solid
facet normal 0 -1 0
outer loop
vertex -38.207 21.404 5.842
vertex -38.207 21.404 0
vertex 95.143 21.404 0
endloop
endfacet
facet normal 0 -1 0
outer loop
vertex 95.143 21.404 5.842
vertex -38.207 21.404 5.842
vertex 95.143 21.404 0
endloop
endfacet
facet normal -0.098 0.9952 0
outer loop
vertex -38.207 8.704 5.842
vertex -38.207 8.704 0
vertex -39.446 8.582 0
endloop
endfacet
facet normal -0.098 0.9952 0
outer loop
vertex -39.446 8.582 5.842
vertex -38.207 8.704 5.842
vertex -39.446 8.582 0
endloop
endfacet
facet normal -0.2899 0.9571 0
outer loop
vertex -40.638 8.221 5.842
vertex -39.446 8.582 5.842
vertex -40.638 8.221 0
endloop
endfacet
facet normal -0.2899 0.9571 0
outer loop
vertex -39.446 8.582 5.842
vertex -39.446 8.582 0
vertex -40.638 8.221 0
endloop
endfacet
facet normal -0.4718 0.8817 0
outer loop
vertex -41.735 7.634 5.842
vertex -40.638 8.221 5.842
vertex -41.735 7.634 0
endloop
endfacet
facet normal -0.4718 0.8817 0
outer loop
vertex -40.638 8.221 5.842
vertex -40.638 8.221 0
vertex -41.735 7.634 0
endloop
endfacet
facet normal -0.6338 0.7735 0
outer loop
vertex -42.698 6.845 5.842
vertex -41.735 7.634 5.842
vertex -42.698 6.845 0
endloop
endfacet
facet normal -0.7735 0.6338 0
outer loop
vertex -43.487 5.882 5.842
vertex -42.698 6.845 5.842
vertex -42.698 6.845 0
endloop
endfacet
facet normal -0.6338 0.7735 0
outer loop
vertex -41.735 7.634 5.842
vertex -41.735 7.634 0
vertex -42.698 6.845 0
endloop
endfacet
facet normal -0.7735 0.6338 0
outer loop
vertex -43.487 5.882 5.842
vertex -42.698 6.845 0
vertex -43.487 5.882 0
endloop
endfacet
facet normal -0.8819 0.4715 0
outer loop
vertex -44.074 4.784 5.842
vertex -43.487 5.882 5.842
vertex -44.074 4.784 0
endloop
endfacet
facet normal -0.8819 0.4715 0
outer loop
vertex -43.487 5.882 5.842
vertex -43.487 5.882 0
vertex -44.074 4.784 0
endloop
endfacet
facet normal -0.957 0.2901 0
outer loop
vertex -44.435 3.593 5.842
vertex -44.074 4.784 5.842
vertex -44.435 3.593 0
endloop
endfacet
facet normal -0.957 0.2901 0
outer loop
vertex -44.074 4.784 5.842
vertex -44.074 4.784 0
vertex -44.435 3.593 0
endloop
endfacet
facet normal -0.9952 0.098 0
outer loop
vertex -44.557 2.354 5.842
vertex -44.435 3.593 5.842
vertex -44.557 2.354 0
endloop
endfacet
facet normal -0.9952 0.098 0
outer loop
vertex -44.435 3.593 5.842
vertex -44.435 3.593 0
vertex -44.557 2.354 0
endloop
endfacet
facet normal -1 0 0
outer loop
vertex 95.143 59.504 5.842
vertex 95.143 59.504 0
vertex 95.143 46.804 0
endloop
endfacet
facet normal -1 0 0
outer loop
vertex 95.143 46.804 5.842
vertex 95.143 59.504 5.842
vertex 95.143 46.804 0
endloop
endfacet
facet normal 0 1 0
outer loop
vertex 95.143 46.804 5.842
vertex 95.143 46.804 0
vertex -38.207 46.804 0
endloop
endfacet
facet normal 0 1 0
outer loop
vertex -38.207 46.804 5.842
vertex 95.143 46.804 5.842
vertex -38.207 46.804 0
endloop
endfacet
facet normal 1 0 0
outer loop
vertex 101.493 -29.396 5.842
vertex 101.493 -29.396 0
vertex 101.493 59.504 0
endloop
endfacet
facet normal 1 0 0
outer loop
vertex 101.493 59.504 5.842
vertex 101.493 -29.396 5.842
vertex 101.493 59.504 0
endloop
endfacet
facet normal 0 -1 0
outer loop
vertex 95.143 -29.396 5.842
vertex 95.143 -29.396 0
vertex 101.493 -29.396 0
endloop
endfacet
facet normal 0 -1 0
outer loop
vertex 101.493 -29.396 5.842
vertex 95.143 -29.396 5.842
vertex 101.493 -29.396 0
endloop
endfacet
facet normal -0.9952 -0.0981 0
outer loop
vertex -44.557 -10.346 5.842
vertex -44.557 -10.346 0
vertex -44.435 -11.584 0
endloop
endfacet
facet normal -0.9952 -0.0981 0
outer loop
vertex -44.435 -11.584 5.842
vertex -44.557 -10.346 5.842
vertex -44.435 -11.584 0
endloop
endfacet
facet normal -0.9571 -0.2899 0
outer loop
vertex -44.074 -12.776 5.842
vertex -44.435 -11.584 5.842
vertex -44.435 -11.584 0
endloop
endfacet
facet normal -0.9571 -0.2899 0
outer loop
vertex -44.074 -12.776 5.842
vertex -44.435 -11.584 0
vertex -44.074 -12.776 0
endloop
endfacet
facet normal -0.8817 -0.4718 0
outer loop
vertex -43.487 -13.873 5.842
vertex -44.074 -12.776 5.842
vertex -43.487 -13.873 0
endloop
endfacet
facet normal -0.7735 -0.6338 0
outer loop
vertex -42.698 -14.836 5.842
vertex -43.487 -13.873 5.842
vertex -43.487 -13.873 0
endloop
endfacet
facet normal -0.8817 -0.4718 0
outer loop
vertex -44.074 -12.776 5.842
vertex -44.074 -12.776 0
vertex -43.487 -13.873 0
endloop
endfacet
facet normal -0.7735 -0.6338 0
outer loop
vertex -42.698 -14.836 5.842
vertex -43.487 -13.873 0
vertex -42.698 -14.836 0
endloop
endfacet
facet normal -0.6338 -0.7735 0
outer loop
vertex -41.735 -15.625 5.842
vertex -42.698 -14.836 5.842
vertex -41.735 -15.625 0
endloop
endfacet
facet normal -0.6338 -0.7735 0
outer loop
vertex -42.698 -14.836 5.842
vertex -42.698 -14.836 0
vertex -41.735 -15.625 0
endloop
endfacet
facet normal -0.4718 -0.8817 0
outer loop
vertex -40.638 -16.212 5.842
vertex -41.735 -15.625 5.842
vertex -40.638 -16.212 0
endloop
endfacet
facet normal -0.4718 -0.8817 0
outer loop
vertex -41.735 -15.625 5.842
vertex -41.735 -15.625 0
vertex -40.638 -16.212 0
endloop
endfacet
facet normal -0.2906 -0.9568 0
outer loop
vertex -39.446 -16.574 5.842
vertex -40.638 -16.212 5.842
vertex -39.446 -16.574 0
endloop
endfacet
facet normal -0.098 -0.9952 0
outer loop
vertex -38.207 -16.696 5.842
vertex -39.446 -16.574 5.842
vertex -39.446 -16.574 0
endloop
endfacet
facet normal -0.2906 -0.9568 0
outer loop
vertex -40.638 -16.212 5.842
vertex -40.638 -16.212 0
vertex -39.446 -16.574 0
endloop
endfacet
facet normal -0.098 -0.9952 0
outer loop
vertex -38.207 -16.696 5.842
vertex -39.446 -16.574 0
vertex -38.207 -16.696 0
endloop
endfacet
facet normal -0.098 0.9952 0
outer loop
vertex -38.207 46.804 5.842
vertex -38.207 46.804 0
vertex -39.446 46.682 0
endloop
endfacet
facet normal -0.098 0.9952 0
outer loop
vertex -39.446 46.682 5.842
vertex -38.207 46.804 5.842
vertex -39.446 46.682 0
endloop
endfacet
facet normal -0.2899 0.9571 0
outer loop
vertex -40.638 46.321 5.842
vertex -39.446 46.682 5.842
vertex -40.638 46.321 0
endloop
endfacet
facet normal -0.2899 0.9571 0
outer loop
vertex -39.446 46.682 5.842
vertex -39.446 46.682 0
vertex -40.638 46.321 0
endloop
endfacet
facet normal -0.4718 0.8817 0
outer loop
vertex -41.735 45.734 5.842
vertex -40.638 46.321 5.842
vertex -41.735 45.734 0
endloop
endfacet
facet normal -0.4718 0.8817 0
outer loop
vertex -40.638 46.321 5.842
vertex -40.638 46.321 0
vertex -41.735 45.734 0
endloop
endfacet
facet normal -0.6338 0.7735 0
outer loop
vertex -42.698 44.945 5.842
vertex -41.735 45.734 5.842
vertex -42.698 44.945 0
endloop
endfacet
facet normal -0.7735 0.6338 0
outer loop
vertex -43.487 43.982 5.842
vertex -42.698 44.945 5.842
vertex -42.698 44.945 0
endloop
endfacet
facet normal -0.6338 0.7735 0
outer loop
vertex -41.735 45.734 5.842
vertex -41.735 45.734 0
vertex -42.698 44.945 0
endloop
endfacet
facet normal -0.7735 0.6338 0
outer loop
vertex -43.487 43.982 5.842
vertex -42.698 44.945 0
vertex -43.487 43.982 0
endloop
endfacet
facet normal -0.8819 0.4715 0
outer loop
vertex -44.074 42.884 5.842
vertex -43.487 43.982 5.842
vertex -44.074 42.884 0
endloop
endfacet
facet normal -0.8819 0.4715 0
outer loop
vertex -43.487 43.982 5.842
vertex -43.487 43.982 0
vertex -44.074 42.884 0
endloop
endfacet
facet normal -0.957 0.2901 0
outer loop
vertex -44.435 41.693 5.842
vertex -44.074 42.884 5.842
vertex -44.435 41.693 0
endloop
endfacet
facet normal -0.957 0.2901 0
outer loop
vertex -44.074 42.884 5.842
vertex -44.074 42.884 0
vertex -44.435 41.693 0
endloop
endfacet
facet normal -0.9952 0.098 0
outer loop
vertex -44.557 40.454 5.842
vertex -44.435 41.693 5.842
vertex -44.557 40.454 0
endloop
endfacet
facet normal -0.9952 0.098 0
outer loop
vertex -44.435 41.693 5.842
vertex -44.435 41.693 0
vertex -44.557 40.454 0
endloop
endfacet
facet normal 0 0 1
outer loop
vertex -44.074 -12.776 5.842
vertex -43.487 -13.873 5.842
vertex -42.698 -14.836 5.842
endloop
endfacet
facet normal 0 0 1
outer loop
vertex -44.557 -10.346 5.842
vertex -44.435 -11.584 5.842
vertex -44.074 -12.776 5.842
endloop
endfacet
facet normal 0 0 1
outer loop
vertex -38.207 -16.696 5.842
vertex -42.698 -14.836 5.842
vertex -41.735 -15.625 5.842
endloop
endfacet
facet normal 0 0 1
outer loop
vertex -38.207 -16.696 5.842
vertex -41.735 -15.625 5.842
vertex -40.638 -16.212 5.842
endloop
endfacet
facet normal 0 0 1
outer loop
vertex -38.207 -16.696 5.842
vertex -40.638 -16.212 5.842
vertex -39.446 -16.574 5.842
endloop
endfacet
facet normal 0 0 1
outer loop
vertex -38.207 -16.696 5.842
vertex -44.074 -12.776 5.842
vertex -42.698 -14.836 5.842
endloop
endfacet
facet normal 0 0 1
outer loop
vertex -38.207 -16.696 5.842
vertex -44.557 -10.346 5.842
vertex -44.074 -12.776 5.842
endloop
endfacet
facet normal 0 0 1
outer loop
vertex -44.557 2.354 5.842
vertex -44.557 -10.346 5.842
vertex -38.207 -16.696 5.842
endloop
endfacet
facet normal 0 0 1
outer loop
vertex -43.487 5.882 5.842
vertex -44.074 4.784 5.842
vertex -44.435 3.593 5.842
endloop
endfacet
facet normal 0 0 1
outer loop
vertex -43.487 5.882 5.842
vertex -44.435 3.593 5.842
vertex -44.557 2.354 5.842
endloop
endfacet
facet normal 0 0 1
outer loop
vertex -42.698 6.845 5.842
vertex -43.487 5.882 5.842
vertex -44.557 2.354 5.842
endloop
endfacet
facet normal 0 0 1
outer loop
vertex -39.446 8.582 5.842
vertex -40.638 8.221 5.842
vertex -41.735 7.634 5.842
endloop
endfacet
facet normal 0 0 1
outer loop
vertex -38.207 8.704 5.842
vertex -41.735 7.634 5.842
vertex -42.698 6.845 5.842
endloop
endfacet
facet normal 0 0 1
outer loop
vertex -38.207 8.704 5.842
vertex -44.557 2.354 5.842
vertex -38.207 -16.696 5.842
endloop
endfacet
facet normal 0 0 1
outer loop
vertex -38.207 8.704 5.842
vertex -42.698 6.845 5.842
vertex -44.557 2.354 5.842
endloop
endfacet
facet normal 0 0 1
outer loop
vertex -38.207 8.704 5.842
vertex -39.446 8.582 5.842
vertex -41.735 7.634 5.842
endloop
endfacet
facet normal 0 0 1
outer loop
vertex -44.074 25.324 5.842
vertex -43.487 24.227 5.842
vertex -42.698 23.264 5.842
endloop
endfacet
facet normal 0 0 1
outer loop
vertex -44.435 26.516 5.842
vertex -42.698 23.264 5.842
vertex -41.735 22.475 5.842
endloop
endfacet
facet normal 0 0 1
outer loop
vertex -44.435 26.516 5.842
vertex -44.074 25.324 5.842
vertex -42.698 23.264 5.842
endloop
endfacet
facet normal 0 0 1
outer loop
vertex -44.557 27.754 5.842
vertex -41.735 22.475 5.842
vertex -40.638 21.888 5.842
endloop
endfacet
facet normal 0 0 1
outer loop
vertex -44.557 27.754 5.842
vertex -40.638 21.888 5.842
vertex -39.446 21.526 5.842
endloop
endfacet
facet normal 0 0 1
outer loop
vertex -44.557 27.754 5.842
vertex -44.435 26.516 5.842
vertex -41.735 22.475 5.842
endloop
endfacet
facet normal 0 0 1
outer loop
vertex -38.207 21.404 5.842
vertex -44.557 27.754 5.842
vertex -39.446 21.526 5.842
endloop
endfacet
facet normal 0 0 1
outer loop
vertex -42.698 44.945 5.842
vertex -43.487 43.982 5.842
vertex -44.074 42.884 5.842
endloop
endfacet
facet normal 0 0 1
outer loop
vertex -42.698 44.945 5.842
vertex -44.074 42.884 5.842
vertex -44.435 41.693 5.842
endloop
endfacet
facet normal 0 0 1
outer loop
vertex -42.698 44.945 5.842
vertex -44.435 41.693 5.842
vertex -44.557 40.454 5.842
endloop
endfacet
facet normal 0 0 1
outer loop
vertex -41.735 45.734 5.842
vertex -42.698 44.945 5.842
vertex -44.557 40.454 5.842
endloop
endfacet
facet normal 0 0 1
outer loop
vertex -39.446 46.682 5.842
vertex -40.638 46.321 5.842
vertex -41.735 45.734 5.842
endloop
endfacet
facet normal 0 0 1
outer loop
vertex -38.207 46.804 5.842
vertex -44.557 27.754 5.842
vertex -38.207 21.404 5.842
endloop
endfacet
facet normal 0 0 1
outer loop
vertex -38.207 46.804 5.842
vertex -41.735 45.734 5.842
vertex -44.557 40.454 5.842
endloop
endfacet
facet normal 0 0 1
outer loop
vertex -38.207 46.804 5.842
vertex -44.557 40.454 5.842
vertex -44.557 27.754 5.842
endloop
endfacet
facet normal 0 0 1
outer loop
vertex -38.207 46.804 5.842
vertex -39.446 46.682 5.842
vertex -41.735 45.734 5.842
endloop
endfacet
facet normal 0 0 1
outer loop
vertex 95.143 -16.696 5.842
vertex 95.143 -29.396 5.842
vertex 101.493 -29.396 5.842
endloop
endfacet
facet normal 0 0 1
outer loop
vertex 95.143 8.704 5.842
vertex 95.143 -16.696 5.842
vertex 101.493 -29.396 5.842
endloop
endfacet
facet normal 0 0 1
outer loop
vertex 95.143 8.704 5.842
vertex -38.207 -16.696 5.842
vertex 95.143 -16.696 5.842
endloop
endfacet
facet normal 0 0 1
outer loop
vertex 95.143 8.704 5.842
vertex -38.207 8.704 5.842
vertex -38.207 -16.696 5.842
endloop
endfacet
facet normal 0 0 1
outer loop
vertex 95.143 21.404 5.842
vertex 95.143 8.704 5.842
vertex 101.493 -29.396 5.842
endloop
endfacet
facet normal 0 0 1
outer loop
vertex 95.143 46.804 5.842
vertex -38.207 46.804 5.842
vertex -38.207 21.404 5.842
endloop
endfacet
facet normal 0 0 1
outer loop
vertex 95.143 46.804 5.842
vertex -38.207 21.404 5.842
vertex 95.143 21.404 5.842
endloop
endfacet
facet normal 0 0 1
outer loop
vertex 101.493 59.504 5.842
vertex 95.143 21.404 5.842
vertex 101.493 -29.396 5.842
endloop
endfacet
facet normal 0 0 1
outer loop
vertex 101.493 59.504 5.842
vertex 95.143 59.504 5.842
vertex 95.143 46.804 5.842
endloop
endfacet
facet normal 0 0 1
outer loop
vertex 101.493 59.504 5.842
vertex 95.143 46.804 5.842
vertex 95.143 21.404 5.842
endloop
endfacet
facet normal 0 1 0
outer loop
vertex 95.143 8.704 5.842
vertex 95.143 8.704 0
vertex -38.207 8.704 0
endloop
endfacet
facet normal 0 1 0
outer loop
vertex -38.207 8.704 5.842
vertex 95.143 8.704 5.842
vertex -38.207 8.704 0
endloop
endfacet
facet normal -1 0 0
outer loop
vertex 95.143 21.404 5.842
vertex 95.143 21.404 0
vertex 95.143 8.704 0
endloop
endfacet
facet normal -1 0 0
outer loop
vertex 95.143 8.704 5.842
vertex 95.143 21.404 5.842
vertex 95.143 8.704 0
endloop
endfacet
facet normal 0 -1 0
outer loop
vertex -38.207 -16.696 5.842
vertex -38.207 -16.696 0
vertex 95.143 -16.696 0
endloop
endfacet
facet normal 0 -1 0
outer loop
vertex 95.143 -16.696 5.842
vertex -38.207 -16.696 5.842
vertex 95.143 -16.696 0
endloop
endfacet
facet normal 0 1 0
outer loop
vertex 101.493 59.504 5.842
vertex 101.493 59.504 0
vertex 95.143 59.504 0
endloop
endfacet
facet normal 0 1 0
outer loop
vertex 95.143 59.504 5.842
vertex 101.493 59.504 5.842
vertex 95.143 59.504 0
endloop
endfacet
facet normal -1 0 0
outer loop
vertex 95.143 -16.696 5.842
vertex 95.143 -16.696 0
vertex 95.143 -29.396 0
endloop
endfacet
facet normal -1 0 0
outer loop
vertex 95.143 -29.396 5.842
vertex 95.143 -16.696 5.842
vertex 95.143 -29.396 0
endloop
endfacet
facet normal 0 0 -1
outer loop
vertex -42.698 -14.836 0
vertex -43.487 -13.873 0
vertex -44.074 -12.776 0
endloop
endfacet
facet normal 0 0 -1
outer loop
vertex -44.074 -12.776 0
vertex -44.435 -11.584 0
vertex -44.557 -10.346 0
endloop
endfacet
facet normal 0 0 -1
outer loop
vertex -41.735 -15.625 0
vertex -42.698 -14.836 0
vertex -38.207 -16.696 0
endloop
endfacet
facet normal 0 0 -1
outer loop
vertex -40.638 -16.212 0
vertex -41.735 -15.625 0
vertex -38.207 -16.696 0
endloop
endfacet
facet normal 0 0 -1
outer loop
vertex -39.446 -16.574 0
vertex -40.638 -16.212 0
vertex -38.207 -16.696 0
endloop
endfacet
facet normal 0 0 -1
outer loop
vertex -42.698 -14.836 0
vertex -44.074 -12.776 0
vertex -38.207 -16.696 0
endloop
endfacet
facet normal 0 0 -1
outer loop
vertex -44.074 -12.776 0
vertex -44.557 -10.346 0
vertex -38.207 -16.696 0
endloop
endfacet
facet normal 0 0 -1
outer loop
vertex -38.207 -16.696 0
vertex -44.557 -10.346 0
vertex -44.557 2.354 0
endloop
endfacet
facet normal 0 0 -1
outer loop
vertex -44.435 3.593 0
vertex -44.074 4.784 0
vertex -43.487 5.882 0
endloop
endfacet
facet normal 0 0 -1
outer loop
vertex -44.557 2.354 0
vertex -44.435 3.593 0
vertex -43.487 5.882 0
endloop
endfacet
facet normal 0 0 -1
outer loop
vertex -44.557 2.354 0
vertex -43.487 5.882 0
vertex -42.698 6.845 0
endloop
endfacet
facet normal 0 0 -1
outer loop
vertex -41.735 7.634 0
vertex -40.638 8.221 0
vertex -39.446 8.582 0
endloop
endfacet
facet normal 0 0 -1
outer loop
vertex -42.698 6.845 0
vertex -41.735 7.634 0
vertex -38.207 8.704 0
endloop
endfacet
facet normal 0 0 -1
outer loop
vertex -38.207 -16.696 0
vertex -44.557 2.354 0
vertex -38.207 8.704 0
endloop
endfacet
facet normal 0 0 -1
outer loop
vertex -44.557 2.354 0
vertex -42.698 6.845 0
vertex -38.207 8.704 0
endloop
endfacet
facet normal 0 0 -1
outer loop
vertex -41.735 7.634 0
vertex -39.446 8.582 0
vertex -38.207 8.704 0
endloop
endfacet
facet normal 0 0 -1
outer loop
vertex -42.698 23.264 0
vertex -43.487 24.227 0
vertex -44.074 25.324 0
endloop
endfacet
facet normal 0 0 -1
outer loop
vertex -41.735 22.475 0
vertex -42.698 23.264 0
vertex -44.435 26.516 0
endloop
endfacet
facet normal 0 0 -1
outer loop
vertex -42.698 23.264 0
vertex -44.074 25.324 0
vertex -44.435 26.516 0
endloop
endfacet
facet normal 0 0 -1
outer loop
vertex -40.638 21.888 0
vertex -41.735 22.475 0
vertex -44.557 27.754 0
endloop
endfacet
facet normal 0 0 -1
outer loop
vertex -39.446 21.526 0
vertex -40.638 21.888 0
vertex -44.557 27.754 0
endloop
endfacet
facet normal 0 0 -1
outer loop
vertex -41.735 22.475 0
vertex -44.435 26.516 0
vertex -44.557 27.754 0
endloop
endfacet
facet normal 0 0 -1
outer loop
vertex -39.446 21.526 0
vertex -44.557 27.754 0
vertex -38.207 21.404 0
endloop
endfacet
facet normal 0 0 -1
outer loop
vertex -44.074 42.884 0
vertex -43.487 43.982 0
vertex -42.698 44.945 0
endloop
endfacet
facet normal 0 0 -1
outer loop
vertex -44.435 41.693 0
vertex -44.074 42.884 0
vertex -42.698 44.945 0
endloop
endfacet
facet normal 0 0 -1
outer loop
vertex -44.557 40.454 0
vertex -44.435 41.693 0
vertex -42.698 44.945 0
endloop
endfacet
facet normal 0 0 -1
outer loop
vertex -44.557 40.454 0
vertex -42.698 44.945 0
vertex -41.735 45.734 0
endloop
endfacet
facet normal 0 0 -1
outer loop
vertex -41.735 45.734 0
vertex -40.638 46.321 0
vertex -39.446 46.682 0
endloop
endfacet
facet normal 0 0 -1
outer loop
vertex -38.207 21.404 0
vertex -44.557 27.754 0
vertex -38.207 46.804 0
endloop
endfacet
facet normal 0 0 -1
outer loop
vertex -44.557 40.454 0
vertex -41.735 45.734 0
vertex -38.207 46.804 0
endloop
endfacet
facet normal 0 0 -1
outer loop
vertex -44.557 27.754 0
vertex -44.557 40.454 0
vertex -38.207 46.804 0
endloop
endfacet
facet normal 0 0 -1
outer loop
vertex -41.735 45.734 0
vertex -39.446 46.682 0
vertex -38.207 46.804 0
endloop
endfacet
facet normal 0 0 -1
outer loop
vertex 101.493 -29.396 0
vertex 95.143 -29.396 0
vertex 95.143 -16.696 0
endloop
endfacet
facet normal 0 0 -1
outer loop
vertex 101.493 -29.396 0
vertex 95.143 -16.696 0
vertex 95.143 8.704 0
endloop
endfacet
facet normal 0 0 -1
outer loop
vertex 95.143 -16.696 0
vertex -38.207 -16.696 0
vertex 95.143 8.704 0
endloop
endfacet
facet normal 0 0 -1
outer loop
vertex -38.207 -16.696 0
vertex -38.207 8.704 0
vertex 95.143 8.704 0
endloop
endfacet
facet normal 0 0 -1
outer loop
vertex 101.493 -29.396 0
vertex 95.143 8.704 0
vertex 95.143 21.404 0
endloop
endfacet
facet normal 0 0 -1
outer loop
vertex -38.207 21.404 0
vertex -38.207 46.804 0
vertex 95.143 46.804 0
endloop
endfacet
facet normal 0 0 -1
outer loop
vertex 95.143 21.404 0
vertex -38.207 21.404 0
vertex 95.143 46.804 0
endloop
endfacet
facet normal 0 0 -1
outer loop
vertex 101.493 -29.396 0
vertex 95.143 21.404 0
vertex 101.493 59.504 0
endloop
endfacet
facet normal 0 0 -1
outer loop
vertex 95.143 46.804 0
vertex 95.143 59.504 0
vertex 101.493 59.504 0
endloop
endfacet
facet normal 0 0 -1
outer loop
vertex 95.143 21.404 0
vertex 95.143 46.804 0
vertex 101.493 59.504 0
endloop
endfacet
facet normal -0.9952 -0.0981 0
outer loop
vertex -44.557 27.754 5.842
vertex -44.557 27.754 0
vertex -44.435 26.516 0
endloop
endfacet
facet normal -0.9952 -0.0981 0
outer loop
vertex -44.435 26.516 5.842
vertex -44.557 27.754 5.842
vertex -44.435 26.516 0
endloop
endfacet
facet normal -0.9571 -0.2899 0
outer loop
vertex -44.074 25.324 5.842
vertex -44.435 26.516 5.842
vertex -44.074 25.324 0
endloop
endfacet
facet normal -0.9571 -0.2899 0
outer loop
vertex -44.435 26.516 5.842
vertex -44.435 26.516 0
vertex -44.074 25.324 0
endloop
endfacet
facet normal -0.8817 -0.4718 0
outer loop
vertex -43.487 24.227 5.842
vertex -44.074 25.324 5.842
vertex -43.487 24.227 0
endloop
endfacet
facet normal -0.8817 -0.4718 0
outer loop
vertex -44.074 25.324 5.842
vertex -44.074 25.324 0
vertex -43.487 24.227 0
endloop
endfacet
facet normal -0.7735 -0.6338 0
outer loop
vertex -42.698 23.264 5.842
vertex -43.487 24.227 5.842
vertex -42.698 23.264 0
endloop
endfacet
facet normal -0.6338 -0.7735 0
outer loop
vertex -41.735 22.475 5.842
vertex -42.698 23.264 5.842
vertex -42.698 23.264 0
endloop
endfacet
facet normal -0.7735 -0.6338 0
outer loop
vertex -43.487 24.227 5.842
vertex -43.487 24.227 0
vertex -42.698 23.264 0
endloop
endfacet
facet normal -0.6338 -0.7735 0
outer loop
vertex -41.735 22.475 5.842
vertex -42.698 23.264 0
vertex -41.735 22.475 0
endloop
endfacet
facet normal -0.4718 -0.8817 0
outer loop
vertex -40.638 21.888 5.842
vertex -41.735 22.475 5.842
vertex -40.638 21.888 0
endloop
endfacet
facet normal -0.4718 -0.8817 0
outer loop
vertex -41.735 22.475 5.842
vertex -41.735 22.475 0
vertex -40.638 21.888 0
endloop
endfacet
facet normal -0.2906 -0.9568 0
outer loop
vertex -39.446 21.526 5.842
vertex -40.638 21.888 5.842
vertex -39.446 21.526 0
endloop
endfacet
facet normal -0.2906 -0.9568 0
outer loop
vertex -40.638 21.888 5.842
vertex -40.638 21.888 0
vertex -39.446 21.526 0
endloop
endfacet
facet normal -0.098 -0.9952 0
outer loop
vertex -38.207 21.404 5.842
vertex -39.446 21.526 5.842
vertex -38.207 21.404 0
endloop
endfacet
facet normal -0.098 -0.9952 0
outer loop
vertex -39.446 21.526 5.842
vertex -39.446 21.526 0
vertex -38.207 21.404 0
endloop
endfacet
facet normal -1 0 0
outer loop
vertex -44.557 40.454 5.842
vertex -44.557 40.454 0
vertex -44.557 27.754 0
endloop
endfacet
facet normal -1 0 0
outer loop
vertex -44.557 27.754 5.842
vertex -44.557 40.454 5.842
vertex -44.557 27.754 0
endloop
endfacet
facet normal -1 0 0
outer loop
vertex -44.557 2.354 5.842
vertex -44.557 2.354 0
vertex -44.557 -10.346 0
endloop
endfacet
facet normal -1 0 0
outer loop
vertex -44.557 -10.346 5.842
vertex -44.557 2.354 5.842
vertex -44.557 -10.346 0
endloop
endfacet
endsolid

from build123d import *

# Parameters (mm, degrees)
F1_DEPTH = 5.842


with BuildPart() as f1:
    # F0 (on Top) → F1 (new body)
    with BuildSketch(Plane.XY):
        with BuildLine():
            Line((95.142507, 46.804437), (-38.207493, 46.804437))
            ThreePointArc((-38.207493, 46.804437), (-42.697621, 44.944565), (-44.557493, 40.454437))
            Line((-44.557493, 40.454437), (-44.557493, 27.754437))
            ThreePointArc((-44.557493, 27.754437), (-42.697621, 23.264309), (-38.207493, 21.404437))
            Line((-38.207493, 21.404437), (95.142507, 21.404437))
            Line((95.142507, 21.404437), (95.142507, 8.704437))
            Line((95.142507, 8.704437), (-38.207493, 8.704437))
            ThreePointArc((-38.207493, 8.704437), (-42.697621, 6.844565), (-44.557493, 2.354437))
            Line((-44.557493, 2.354437), (-44.557493, -10.345563))
            ThreePointArc((-44.557493, -10.345563), (-42.697621, -14.835691), (-38.207493, -16.695563))
            Line((-38.207493, -16.695563), (95.142507, -16.695563))
            Line((95.142507, -16.695563), (95.142507, -29.395563))
            Line((95.142507, -29.395563), (101.492507, -29.395563))
            Line((101.492507, -29.395563), (101.492507, 59.504437))
            Line((101.492507, 59.504437), (95.142507, 59.504437))
            Line((95.142507, 59.504437), (95.142507, 46.804437))
        make_face()
    extrude(amount=F1_DEPTH)


solid = f1.part
